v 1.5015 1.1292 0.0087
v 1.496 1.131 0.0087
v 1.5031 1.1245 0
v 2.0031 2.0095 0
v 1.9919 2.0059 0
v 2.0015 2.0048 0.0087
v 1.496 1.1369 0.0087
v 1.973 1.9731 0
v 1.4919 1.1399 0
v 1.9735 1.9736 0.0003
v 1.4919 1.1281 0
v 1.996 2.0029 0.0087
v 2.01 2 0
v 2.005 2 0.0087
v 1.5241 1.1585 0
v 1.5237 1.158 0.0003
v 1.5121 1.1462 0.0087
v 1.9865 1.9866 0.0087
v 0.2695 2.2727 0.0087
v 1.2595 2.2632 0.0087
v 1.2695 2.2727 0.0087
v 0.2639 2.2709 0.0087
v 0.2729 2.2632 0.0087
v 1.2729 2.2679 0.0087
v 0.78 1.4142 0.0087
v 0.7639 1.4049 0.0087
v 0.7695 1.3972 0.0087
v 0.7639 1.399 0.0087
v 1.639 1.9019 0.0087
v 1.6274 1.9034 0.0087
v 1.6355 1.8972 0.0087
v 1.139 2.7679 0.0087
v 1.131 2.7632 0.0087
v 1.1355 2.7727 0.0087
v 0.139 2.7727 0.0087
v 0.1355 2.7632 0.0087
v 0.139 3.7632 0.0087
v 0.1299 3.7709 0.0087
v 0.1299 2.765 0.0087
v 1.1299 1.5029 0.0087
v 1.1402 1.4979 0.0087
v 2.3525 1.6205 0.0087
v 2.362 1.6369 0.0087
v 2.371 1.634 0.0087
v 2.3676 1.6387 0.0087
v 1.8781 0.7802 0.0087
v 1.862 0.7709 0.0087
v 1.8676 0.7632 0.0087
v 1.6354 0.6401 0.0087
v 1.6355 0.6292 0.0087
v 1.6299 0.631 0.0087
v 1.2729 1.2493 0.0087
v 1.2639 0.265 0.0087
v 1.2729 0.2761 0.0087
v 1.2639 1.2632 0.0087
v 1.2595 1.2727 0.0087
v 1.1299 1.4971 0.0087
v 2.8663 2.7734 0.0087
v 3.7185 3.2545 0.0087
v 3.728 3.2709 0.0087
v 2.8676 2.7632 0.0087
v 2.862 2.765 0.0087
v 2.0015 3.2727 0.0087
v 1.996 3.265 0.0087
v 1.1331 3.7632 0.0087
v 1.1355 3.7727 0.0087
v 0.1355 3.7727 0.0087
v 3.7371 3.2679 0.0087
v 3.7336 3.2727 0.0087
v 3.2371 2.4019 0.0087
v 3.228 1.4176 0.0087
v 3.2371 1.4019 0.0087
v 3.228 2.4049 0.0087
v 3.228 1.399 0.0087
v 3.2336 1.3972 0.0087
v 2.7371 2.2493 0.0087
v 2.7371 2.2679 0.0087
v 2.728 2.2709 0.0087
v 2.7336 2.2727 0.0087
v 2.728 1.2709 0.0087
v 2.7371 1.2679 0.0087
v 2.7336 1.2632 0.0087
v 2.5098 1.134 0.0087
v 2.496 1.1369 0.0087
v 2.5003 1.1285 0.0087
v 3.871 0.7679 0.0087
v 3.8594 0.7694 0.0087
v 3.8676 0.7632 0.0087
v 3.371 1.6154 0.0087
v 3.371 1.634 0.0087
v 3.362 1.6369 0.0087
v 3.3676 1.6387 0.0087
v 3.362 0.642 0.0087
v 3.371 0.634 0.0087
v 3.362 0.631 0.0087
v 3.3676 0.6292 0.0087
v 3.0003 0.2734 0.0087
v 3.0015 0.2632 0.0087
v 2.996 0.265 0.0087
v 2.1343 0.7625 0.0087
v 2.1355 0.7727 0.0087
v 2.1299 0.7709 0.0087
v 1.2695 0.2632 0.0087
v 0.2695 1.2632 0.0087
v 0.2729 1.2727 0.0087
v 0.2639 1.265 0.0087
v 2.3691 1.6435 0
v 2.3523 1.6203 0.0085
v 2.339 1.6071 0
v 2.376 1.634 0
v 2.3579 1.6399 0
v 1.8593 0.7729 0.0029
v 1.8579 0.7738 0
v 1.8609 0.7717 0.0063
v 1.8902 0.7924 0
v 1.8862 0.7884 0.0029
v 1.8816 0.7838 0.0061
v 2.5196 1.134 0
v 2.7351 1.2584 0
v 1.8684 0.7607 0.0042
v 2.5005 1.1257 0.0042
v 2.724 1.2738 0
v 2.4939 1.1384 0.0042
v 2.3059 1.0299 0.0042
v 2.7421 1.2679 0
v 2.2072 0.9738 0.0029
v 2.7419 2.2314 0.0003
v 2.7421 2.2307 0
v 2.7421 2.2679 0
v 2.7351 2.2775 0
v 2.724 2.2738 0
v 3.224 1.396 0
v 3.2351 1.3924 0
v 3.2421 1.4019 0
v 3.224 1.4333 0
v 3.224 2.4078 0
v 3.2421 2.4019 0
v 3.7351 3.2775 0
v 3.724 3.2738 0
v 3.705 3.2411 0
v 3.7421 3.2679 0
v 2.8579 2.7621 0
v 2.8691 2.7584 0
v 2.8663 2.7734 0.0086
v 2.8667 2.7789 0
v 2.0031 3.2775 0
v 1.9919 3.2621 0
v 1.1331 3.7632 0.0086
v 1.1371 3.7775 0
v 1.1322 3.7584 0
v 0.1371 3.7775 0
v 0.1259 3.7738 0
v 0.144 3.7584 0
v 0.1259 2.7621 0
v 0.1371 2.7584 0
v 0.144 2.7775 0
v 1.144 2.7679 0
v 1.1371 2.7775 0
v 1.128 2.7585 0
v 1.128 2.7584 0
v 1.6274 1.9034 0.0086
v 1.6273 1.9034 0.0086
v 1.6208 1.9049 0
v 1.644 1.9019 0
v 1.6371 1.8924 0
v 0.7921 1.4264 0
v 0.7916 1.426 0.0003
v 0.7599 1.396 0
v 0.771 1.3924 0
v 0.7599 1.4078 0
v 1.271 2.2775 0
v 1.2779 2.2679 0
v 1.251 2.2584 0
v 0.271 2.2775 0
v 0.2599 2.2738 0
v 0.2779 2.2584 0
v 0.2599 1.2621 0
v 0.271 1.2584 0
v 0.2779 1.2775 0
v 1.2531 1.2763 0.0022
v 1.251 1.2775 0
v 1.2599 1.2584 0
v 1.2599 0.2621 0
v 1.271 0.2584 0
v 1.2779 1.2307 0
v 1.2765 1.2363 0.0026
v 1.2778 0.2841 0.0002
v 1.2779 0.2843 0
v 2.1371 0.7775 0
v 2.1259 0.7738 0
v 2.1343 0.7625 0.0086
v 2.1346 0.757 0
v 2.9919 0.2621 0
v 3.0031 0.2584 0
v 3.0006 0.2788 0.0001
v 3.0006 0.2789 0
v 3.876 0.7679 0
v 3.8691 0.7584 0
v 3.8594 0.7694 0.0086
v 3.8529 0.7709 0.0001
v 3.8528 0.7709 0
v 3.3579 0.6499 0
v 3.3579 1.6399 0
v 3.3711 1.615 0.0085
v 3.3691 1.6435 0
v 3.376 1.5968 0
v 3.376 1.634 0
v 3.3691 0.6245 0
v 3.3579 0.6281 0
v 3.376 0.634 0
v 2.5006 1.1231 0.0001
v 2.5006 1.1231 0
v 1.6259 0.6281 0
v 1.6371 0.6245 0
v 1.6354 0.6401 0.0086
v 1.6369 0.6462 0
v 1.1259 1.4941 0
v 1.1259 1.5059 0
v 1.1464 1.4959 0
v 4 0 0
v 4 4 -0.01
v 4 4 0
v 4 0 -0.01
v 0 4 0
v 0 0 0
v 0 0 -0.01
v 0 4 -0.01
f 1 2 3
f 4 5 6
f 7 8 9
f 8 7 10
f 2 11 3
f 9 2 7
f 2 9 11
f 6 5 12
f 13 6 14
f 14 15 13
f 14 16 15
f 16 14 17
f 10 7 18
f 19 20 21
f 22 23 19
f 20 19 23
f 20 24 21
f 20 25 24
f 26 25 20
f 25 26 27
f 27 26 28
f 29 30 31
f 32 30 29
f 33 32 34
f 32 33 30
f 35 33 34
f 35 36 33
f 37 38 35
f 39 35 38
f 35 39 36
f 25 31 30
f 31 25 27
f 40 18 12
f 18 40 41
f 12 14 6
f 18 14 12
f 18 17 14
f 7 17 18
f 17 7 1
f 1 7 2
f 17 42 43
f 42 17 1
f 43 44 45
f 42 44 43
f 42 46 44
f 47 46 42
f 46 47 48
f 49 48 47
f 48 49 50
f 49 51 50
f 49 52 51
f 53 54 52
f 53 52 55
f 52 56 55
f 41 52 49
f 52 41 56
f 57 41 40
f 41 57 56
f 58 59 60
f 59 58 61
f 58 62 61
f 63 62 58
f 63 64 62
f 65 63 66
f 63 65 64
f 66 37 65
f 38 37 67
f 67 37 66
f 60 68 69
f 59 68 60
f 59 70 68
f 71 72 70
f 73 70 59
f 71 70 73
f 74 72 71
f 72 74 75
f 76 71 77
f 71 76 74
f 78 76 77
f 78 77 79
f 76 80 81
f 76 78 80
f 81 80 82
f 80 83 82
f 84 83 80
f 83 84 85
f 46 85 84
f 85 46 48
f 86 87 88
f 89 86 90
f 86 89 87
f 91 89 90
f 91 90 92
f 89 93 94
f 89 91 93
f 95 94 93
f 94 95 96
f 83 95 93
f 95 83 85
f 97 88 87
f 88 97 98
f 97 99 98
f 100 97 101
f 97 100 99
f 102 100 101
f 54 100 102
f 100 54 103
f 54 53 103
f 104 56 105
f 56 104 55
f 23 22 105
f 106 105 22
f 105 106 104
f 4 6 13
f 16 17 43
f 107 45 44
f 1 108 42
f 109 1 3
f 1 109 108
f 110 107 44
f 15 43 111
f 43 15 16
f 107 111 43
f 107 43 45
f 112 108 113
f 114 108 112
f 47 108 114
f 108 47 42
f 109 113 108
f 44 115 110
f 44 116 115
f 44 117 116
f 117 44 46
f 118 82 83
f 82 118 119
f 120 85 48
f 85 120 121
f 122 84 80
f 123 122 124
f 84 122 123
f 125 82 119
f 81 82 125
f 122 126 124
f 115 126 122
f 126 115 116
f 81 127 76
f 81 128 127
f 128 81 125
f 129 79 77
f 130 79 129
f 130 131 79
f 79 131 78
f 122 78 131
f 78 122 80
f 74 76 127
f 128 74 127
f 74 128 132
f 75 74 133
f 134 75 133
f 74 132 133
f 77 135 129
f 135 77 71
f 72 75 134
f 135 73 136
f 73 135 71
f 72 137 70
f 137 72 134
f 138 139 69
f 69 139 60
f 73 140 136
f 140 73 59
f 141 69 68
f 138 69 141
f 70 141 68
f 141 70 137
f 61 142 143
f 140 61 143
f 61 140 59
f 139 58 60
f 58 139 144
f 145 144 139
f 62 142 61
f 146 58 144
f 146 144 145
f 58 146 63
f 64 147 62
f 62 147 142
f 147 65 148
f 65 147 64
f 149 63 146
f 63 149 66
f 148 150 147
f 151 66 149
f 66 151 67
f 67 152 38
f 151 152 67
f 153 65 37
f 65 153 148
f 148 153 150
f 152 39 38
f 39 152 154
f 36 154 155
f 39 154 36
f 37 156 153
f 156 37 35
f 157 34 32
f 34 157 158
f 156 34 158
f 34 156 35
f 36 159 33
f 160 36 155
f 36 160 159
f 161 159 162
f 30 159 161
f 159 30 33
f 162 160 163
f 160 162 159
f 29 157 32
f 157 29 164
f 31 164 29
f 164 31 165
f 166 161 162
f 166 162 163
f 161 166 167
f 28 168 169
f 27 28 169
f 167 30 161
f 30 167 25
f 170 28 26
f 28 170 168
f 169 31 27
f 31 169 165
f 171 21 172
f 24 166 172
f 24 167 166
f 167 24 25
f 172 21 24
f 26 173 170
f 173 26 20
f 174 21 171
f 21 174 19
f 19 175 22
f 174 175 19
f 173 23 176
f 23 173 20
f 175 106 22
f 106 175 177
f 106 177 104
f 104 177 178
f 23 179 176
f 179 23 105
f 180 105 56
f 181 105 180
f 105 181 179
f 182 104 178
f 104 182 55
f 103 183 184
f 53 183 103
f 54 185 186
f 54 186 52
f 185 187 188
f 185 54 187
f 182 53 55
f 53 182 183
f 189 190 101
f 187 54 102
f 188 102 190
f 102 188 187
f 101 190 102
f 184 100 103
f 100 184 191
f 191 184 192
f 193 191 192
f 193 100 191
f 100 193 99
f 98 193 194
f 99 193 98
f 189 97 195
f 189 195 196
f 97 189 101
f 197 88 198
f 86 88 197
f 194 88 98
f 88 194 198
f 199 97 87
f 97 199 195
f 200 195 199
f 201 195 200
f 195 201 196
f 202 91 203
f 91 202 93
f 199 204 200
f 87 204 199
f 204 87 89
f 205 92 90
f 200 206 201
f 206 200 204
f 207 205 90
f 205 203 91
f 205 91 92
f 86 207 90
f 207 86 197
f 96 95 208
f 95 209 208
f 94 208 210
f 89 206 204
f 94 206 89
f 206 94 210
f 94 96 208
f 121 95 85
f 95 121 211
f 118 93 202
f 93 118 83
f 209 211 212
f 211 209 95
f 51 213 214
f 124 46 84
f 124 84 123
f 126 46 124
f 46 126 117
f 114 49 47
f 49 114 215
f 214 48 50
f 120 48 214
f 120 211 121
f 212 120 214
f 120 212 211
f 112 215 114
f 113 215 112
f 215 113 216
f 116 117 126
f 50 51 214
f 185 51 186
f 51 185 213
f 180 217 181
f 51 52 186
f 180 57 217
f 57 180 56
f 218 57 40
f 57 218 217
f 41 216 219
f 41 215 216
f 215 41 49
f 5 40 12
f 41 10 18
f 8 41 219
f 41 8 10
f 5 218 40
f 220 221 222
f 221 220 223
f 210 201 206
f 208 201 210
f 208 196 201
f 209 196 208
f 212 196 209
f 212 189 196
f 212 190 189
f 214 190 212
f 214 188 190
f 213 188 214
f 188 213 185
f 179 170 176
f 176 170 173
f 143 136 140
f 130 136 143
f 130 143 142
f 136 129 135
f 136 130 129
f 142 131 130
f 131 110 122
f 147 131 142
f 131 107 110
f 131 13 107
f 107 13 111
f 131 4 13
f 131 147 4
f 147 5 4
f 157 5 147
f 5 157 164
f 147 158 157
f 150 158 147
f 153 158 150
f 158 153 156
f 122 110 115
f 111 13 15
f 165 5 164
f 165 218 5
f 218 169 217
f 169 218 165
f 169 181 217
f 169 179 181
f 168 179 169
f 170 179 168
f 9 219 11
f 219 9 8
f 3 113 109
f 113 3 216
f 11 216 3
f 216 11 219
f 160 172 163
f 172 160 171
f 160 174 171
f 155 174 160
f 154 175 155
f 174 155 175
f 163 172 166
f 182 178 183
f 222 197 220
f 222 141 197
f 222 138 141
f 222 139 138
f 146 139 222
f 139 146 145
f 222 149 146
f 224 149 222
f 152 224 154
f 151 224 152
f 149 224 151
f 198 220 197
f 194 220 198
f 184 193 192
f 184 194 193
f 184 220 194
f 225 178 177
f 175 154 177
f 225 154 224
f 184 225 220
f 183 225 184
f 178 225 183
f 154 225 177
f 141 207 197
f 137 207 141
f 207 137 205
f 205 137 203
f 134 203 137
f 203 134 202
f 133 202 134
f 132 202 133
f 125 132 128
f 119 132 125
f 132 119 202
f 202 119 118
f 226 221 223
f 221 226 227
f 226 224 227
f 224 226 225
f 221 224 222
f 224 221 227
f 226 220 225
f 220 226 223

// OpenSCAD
hull(){
    translate([2.0, 2.0]) sphere(0.01);
    translate([1.5, 1.1339745962]) sphere(0.01);
}
hull(){
    translate([1.5, 1.1339745962]) sphere(0.01);
    translate([2.3660254038, 1.6339745962]) sphere(0.01);
}
hull(){
    translate([2.3660254038, 1.6339745962]) sphere(0.01);
    translate([1.8660254038, 0.7679491924]) sphere(0.01);
}
hull(){
    translate([1.8660254038, 0.7679491924]) sphere(0.01);
    translate([2.7320508076, 1.2679491924]) sphere(0.01);
}
hull(){
    translate([2.7320508076, 1.2679491924]) sphere(0.01);
    translate([2.7320508076, 2.2679491924]) sphere(0.01);
}
hull(){
    translate([2.7320508076, 2.2679491924]) sphere(0.01);
    translate([3.2320508076, 1.4019237886]) sphere(0.01);
}
hull(){
    translate([3.2320508076, 1.4019237886]) sphere(0.01);
    translate([3.2320508076, 2.4019237886]) sphere(0.01);
}
hull(){
    translate([3.2320508076, 2.4019237886]) sphere(0.01);
    translate([3.7320508076, 3.2679491924]) sphere(0.01);
}
hull(){
    translate([3.7320508076, 3.2679491924]) sphere(0.01);
    translate([2.8660254038, 2.7679491924]) sphere(0.01);
}
hull(){
    translate([2.8660254038, 2.7679491924]) sphere(0.01);
    translate([2.0, 3.2679491924]) sphere(0.01);
}
hull(){
    translate([2.0, 3.2679491924]) sphere(0.01);
    translate([1.1339745962, 3.7679491924]) sphere(0.01);
}
hull(){
    translate([1.1339745962, 3.7679491924]) sphere(0.01);
    translate([0.1339745962, 3.7679491924]) sphere(0.01);
}
hull(){
    translate([0.1339745962, 3.7679491924]) sphere(0.01);
    translate([0.1339745962, 2.7679491924]) sphere(0.01);
}
hull(){
    translate([0.1339745962, 2.7679491924]) sphere(0.01);
    translate([1.1339745962, 2.7679491924]) sphere(0.01);
}
hull(){
    translate([1.1339745962, 2.7679491924]) sphere(0.01);
    translate([1.6339745962, 1.9019237886]) sphere(0.01);
}
hull(){
    translate([1.6339745962, 1.9019237886]) sphere(0.01);
    translate([0.7679491924, 1.4019237886]) sphere(0.01);
}
hull(){
    translate([0.7679491924, 1.4019237886]) sphere(0.01);
    translate([1.2679491924, 2.2679491924]) sphere(0.01);
}
hull(){
    translate([1.2679491924, 2.2679491924]) sphere(0.01);
    translate([0.2679491924, 2.2679491924]) sphere(0.01);
}
hull(){
    translate([0.2679491924, 2.2679491924]) sphere(0.01);
    translate([0.2679491924, 1.2679491924]) sphere(0.01);
}
hull(){
    translate([0.2679491924, 1.2679491924]) sphere(0.01);
    translate([1.2679491924, 1.2679491924]) sphere(0.01);
}
hull(){
    translate([1.2679491924, 1.2679491924]) sphere(0.01);
    translate([1.2679491924, 0.2679491924]) sphere(0.01);
}
hull(){
    translate([1.2679491924, 0.2679491924]) sphere(0.01);
    translate([2.1339745962, 0.7679491924]) sphere(0.01);
}
hull(){
    translate([2.1339745962, 0.7679491924]) sphere(0.01);
    translate([3.0, 0.2679491924]) sphere(0.01);
}
hull(){
    translate([3.0, 0.2679491924]) sphere(0.01);
    translate([3.8660254038, 0.7679491924]) sphere(0.01);
}
hull(){
    translate([3.8660254038, 0.7679491924]) sphere(0.01);
    translate([3.3660254038, 1.6339745962]) sphere(0.01);
}
hull(){
    translate([3.3660254038, 1.6339745962]) sphere(0.01);
    translate([3.3660254038, 0.6339745962]) sphere(0.01);
}
hull(){
    translate([3.3660254038, 0.6339745962]) sphere(0.01);
    translate([2.5, 1.1339745962]) sphere(0.01);
}
hull(){
    translate([2.5, 1.1339745962]) sphere(0.01);
    translate([1.6339745962, 0.6339745962]) sphere(0.01);
}
hull(){
    translate([1.6339745962, 0.6339745962]) sphere(0.01);
    translate([1.1339745962, 1.5]) sphere(0.01);
}
hull(){
    translate([1.1339745962, 1.5]) sphere(0.01);
    translate([2.0, 2.0]) sphere(0.01);
}
translate([0,0,-0.01]) color([0.1,0.1,0.1]) cube([4,4,0.01]);
